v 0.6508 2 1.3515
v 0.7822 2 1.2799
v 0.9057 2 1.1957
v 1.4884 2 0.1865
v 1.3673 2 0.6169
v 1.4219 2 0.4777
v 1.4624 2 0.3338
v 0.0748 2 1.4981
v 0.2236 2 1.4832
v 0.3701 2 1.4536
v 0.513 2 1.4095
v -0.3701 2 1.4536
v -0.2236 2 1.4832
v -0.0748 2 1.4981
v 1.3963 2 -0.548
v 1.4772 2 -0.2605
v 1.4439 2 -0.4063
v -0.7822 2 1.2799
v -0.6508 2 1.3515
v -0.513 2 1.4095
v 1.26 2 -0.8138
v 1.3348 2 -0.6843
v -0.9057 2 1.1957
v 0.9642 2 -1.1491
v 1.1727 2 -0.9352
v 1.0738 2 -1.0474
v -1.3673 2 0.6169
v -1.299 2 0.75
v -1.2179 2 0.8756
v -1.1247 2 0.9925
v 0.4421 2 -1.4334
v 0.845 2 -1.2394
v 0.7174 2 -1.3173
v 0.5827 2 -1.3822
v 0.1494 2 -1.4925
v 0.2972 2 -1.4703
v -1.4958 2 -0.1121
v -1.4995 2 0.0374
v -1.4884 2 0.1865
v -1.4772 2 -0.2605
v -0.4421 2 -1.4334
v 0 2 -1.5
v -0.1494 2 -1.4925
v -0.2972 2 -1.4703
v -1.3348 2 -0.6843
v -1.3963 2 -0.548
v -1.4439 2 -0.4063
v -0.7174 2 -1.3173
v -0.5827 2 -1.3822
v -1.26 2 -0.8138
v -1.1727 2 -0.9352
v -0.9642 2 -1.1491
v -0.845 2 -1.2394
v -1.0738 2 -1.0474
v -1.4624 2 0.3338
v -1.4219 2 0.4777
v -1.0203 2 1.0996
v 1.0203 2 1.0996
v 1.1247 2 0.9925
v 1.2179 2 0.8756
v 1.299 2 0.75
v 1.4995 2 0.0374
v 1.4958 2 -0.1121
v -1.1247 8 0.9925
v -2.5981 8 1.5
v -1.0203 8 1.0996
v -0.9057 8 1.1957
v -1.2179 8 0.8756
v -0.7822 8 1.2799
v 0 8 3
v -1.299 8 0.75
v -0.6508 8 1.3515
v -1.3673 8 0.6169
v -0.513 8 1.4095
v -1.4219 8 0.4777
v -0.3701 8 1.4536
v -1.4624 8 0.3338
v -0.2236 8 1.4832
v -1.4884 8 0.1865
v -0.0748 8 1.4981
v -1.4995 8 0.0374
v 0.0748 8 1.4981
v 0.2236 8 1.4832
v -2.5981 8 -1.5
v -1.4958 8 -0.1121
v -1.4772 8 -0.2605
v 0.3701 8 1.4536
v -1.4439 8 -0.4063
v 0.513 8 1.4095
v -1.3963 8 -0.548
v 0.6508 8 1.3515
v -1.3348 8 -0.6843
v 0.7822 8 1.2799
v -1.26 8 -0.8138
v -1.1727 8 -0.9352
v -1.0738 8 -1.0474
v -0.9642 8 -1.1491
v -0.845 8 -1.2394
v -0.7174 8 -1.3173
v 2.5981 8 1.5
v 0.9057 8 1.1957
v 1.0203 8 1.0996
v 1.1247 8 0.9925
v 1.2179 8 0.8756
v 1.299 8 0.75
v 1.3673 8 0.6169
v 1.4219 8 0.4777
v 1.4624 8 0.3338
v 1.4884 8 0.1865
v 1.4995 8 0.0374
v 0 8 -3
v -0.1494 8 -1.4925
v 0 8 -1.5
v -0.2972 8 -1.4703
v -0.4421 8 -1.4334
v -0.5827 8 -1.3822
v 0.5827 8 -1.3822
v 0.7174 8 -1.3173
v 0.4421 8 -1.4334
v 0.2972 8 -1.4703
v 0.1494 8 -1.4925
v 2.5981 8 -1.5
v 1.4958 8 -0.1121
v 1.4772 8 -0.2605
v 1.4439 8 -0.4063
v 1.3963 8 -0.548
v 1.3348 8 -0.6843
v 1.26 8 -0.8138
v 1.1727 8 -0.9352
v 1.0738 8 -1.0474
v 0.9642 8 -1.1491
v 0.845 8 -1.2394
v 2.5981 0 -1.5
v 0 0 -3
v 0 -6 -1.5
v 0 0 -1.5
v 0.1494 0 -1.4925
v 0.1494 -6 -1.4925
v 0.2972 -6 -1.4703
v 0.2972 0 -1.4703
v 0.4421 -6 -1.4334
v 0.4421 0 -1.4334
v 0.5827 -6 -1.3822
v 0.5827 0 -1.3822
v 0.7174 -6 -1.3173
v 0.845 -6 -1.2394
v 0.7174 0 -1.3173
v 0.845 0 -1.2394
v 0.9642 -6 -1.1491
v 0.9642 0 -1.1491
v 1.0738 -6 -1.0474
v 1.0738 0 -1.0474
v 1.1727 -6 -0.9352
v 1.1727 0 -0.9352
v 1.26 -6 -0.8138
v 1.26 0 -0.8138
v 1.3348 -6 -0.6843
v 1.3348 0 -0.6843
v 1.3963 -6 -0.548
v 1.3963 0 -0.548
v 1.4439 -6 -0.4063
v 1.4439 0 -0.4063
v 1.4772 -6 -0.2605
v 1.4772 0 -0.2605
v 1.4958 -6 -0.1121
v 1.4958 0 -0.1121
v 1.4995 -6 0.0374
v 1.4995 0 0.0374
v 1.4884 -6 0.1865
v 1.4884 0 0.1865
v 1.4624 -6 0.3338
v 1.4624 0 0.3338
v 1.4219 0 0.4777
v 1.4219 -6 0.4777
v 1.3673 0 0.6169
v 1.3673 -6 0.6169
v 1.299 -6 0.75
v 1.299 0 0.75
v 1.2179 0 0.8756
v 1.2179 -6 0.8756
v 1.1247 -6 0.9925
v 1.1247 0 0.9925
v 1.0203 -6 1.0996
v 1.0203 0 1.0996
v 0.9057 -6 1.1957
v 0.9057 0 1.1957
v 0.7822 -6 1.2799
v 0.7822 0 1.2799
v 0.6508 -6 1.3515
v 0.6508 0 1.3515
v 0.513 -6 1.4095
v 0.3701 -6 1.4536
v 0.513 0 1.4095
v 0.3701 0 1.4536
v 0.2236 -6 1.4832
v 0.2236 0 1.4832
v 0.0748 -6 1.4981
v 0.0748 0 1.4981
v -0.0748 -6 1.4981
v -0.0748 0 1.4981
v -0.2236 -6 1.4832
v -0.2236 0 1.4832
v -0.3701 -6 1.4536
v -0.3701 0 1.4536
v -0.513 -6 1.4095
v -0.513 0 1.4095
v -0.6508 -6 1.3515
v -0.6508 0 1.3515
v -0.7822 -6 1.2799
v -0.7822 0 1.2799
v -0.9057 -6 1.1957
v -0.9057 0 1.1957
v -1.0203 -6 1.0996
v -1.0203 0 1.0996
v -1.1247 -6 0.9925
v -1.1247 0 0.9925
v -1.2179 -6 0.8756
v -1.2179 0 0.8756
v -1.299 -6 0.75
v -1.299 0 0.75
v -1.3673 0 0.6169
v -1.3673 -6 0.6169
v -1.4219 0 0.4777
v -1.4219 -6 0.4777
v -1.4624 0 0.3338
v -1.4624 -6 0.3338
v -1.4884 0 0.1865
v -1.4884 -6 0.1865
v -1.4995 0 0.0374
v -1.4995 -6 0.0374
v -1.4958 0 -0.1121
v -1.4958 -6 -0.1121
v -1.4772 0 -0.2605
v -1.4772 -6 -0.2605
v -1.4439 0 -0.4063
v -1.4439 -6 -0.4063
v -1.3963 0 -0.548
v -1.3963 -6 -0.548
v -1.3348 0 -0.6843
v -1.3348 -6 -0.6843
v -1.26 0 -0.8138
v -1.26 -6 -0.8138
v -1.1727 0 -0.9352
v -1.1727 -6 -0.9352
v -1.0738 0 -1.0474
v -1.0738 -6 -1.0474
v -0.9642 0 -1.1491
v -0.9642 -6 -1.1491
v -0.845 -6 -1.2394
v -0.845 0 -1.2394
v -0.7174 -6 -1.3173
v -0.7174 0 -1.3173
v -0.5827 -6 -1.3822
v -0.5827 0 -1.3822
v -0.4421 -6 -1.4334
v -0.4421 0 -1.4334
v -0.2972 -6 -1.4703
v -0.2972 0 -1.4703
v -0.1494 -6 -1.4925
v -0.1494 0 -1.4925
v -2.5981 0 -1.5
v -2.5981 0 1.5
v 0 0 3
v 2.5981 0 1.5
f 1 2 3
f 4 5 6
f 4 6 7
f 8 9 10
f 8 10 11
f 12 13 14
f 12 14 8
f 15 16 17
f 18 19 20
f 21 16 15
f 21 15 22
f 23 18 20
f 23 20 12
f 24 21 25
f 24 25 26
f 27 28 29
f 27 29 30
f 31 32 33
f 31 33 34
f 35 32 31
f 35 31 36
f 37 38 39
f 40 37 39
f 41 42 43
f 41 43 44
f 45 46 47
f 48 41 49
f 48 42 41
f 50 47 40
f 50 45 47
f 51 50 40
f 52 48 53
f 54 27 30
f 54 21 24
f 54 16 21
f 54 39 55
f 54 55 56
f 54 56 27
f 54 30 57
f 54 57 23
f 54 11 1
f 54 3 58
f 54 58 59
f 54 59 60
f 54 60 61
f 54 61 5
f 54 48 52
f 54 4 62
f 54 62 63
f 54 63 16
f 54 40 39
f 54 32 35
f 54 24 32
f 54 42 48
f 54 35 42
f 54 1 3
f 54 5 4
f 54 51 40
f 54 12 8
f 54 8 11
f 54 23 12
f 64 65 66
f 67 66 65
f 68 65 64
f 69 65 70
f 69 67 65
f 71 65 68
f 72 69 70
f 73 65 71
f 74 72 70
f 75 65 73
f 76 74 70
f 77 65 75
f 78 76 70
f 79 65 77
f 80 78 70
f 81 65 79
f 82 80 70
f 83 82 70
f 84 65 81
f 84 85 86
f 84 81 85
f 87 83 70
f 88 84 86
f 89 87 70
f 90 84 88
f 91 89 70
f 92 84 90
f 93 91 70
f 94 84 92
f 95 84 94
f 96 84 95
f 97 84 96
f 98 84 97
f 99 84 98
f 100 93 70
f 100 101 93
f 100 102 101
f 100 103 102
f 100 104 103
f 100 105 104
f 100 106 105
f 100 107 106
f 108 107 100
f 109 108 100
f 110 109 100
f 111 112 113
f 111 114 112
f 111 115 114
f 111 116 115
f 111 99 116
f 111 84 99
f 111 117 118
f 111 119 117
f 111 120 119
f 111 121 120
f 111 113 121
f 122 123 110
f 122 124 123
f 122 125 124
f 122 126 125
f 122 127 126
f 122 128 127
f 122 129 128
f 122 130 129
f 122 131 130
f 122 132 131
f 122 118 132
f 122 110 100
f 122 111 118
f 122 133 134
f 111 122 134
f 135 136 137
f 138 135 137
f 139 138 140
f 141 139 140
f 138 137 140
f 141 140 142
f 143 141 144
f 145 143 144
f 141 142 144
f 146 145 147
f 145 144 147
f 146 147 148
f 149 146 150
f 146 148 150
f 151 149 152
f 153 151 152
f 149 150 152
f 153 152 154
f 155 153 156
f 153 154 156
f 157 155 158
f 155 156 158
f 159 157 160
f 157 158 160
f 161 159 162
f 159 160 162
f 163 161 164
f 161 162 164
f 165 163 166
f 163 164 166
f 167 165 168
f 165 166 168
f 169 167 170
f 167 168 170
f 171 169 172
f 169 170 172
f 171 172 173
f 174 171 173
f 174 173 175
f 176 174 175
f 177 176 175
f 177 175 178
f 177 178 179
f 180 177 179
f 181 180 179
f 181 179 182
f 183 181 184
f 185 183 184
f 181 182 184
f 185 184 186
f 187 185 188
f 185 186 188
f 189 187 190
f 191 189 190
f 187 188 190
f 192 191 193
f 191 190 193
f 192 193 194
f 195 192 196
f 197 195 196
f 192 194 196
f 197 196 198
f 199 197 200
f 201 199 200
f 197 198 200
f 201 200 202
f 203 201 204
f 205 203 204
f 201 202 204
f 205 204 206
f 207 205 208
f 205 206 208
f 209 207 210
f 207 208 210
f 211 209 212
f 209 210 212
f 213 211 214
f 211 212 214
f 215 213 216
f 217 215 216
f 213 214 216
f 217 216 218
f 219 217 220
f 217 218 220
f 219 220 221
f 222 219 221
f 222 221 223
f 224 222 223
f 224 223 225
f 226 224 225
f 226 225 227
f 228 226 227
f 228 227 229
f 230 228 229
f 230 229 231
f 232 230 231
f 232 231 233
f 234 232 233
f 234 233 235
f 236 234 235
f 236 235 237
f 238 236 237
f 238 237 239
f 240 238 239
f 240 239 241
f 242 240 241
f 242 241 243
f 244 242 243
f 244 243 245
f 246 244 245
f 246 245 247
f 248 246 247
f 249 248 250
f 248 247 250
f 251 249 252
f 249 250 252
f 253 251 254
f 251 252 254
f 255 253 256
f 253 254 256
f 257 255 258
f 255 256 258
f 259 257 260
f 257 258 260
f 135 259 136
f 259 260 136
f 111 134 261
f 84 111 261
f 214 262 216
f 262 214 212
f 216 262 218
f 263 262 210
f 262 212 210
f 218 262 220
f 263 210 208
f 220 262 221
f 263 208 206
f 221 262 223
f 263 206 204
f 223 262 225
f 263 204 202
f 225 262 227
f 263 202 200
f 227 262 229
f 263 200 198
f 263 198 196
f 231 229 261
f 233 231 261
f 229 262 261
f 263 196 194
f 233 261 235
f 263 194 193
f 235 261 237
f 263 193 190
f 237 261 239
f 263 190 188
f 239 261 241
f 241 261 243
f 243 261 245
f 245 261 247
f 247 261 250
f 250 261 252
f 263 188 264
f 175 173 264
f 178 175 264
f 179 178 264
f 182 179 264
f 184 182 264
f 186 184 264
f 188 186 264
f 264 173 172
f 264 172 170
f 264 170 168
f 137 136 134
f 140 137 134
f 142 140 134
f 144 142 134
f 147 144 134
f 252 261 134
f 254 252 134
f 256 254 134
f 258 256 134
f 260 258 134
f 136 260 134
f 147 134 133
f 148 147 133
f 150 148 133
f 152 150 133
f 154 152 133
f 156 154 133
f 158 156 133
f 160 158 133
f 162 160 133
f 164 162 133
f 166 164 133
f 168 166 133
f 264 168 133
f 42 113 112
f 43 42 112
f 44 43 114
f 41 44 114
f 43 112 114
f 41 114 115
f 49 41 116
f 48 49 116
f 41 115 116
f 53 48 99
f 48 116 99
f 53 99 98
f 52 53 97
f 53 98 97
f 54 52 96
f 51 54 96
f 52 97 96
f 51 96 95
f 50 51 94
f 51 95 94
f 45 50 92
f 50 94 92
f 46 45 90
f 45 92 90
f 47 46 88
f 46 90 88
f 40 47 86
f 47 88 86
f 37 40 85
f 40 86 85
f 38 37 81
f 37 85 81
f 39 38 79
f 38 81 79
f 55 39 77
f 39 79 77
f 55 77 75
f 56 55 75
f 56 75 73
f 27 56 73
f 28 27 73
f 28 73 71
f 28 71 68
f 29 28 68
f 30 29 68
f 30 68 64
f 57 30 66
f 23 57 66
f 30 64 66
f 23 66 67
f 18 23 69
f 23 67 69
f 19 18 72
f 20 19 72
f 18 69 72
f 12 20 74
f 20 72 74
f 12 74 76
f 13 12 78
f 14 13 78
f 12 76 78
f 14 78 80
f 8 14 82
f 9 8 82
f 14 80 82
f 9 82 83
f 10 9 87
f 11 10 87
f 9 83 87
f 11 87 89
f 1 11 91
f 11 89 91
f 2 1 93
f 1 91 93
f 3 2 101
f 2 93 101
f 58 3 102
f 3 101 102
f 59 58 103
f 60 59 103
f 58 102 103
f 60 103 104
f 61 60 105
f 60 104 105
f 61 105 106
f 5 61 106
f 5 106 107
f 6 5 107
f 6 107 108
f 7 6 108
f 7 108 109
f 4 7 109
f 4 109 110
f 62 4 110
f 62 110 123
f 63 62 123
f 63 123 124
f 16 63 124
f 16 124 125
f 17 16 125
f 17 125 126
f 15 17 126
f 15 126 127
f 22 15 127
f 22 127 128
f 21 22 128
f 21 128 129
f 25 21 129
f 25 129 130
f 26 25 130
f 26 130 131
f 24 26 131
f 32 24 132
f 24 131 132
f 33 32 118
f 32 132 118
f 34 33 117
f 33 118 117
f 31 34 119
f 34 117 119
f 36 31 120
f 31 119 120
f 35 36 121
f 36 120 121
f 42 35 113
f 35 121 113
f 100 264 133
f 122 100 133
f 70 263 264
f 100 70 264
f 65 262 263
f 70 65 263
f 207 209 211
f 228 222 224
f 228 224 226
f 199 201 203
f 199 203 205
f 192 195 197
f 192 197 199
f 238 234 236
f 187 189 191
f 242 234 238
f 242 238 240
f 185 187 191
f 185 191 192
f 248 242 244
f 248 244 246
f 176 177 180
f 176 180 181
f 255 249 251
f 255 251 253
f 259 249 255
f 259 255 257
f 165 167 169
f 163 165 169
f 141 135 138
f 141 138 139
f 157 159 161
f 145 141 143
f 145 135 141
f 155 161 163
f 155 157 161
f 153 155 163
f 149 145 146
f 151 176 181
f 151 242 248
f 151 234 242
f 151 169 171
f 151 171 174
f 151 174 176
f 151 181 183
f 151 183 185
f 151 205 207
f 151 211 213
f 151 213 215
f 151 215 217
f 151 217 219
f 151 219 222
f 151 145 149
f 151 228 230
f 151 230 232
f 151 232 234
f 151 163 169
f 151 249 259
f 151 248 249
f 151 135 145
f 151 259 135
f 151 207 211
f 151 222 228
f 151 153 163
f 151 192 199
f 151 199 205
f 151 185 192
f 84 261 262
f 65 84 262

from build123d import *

# Parameters (mm, degrees)
SALIENTE_EXTRUIR1_DEPTH = 8
CROQUIS2_R              = 1.5
SALIENTE_EXTRUIR2_DEPTH = 6
CROQUIS3_R              = 1.5
CORTAR_EXTRUIR1_DEPTH   = 6


with BuildPart() as part:
    # Croquis1 → Saliente-Extruir1 (new body)
    with BuildSketch(Plane(origin=(0, 0, 0), x_dir=(1, 0, 0), z_dir=(0, 1, 0))):
        Polygon((-2.598076211, 1.5), (-2.598076211, -1.5), (0, -3), (2.598076211, -1.5), (2.598076211, 1.5), (0, 3), align=None)
    extrude(amount=SALIENTE_EXTRUIR1_DEPTH)

    # Croquis2 → Saliente-Extruir2 (add)
    with BuildSketch(Plane.XZ):
        with Locations(Location((0, 0, 0), (0, 0, 270))):
            Circle(CROQUIS2_R)
    extrude(amount=SALIENTE_EXTRUIR2_DEPTH)

    # Croquis3 → Cortar-Extruir1 (cut)
    with BuildSketch(Plane(origin=(0, 8, 0), x_dir=(1, 0, 0), z_dir=(0, 1, 0))):
        with Locations(Location((0, 0, 0), (0, 0, 90))):
            Circle(CROQUIS3_R)
    extrude(amount=-CORTAR_EXTRUIR1_DEPTH, mode=Mode.SUBTRACT)


solid = part.part
